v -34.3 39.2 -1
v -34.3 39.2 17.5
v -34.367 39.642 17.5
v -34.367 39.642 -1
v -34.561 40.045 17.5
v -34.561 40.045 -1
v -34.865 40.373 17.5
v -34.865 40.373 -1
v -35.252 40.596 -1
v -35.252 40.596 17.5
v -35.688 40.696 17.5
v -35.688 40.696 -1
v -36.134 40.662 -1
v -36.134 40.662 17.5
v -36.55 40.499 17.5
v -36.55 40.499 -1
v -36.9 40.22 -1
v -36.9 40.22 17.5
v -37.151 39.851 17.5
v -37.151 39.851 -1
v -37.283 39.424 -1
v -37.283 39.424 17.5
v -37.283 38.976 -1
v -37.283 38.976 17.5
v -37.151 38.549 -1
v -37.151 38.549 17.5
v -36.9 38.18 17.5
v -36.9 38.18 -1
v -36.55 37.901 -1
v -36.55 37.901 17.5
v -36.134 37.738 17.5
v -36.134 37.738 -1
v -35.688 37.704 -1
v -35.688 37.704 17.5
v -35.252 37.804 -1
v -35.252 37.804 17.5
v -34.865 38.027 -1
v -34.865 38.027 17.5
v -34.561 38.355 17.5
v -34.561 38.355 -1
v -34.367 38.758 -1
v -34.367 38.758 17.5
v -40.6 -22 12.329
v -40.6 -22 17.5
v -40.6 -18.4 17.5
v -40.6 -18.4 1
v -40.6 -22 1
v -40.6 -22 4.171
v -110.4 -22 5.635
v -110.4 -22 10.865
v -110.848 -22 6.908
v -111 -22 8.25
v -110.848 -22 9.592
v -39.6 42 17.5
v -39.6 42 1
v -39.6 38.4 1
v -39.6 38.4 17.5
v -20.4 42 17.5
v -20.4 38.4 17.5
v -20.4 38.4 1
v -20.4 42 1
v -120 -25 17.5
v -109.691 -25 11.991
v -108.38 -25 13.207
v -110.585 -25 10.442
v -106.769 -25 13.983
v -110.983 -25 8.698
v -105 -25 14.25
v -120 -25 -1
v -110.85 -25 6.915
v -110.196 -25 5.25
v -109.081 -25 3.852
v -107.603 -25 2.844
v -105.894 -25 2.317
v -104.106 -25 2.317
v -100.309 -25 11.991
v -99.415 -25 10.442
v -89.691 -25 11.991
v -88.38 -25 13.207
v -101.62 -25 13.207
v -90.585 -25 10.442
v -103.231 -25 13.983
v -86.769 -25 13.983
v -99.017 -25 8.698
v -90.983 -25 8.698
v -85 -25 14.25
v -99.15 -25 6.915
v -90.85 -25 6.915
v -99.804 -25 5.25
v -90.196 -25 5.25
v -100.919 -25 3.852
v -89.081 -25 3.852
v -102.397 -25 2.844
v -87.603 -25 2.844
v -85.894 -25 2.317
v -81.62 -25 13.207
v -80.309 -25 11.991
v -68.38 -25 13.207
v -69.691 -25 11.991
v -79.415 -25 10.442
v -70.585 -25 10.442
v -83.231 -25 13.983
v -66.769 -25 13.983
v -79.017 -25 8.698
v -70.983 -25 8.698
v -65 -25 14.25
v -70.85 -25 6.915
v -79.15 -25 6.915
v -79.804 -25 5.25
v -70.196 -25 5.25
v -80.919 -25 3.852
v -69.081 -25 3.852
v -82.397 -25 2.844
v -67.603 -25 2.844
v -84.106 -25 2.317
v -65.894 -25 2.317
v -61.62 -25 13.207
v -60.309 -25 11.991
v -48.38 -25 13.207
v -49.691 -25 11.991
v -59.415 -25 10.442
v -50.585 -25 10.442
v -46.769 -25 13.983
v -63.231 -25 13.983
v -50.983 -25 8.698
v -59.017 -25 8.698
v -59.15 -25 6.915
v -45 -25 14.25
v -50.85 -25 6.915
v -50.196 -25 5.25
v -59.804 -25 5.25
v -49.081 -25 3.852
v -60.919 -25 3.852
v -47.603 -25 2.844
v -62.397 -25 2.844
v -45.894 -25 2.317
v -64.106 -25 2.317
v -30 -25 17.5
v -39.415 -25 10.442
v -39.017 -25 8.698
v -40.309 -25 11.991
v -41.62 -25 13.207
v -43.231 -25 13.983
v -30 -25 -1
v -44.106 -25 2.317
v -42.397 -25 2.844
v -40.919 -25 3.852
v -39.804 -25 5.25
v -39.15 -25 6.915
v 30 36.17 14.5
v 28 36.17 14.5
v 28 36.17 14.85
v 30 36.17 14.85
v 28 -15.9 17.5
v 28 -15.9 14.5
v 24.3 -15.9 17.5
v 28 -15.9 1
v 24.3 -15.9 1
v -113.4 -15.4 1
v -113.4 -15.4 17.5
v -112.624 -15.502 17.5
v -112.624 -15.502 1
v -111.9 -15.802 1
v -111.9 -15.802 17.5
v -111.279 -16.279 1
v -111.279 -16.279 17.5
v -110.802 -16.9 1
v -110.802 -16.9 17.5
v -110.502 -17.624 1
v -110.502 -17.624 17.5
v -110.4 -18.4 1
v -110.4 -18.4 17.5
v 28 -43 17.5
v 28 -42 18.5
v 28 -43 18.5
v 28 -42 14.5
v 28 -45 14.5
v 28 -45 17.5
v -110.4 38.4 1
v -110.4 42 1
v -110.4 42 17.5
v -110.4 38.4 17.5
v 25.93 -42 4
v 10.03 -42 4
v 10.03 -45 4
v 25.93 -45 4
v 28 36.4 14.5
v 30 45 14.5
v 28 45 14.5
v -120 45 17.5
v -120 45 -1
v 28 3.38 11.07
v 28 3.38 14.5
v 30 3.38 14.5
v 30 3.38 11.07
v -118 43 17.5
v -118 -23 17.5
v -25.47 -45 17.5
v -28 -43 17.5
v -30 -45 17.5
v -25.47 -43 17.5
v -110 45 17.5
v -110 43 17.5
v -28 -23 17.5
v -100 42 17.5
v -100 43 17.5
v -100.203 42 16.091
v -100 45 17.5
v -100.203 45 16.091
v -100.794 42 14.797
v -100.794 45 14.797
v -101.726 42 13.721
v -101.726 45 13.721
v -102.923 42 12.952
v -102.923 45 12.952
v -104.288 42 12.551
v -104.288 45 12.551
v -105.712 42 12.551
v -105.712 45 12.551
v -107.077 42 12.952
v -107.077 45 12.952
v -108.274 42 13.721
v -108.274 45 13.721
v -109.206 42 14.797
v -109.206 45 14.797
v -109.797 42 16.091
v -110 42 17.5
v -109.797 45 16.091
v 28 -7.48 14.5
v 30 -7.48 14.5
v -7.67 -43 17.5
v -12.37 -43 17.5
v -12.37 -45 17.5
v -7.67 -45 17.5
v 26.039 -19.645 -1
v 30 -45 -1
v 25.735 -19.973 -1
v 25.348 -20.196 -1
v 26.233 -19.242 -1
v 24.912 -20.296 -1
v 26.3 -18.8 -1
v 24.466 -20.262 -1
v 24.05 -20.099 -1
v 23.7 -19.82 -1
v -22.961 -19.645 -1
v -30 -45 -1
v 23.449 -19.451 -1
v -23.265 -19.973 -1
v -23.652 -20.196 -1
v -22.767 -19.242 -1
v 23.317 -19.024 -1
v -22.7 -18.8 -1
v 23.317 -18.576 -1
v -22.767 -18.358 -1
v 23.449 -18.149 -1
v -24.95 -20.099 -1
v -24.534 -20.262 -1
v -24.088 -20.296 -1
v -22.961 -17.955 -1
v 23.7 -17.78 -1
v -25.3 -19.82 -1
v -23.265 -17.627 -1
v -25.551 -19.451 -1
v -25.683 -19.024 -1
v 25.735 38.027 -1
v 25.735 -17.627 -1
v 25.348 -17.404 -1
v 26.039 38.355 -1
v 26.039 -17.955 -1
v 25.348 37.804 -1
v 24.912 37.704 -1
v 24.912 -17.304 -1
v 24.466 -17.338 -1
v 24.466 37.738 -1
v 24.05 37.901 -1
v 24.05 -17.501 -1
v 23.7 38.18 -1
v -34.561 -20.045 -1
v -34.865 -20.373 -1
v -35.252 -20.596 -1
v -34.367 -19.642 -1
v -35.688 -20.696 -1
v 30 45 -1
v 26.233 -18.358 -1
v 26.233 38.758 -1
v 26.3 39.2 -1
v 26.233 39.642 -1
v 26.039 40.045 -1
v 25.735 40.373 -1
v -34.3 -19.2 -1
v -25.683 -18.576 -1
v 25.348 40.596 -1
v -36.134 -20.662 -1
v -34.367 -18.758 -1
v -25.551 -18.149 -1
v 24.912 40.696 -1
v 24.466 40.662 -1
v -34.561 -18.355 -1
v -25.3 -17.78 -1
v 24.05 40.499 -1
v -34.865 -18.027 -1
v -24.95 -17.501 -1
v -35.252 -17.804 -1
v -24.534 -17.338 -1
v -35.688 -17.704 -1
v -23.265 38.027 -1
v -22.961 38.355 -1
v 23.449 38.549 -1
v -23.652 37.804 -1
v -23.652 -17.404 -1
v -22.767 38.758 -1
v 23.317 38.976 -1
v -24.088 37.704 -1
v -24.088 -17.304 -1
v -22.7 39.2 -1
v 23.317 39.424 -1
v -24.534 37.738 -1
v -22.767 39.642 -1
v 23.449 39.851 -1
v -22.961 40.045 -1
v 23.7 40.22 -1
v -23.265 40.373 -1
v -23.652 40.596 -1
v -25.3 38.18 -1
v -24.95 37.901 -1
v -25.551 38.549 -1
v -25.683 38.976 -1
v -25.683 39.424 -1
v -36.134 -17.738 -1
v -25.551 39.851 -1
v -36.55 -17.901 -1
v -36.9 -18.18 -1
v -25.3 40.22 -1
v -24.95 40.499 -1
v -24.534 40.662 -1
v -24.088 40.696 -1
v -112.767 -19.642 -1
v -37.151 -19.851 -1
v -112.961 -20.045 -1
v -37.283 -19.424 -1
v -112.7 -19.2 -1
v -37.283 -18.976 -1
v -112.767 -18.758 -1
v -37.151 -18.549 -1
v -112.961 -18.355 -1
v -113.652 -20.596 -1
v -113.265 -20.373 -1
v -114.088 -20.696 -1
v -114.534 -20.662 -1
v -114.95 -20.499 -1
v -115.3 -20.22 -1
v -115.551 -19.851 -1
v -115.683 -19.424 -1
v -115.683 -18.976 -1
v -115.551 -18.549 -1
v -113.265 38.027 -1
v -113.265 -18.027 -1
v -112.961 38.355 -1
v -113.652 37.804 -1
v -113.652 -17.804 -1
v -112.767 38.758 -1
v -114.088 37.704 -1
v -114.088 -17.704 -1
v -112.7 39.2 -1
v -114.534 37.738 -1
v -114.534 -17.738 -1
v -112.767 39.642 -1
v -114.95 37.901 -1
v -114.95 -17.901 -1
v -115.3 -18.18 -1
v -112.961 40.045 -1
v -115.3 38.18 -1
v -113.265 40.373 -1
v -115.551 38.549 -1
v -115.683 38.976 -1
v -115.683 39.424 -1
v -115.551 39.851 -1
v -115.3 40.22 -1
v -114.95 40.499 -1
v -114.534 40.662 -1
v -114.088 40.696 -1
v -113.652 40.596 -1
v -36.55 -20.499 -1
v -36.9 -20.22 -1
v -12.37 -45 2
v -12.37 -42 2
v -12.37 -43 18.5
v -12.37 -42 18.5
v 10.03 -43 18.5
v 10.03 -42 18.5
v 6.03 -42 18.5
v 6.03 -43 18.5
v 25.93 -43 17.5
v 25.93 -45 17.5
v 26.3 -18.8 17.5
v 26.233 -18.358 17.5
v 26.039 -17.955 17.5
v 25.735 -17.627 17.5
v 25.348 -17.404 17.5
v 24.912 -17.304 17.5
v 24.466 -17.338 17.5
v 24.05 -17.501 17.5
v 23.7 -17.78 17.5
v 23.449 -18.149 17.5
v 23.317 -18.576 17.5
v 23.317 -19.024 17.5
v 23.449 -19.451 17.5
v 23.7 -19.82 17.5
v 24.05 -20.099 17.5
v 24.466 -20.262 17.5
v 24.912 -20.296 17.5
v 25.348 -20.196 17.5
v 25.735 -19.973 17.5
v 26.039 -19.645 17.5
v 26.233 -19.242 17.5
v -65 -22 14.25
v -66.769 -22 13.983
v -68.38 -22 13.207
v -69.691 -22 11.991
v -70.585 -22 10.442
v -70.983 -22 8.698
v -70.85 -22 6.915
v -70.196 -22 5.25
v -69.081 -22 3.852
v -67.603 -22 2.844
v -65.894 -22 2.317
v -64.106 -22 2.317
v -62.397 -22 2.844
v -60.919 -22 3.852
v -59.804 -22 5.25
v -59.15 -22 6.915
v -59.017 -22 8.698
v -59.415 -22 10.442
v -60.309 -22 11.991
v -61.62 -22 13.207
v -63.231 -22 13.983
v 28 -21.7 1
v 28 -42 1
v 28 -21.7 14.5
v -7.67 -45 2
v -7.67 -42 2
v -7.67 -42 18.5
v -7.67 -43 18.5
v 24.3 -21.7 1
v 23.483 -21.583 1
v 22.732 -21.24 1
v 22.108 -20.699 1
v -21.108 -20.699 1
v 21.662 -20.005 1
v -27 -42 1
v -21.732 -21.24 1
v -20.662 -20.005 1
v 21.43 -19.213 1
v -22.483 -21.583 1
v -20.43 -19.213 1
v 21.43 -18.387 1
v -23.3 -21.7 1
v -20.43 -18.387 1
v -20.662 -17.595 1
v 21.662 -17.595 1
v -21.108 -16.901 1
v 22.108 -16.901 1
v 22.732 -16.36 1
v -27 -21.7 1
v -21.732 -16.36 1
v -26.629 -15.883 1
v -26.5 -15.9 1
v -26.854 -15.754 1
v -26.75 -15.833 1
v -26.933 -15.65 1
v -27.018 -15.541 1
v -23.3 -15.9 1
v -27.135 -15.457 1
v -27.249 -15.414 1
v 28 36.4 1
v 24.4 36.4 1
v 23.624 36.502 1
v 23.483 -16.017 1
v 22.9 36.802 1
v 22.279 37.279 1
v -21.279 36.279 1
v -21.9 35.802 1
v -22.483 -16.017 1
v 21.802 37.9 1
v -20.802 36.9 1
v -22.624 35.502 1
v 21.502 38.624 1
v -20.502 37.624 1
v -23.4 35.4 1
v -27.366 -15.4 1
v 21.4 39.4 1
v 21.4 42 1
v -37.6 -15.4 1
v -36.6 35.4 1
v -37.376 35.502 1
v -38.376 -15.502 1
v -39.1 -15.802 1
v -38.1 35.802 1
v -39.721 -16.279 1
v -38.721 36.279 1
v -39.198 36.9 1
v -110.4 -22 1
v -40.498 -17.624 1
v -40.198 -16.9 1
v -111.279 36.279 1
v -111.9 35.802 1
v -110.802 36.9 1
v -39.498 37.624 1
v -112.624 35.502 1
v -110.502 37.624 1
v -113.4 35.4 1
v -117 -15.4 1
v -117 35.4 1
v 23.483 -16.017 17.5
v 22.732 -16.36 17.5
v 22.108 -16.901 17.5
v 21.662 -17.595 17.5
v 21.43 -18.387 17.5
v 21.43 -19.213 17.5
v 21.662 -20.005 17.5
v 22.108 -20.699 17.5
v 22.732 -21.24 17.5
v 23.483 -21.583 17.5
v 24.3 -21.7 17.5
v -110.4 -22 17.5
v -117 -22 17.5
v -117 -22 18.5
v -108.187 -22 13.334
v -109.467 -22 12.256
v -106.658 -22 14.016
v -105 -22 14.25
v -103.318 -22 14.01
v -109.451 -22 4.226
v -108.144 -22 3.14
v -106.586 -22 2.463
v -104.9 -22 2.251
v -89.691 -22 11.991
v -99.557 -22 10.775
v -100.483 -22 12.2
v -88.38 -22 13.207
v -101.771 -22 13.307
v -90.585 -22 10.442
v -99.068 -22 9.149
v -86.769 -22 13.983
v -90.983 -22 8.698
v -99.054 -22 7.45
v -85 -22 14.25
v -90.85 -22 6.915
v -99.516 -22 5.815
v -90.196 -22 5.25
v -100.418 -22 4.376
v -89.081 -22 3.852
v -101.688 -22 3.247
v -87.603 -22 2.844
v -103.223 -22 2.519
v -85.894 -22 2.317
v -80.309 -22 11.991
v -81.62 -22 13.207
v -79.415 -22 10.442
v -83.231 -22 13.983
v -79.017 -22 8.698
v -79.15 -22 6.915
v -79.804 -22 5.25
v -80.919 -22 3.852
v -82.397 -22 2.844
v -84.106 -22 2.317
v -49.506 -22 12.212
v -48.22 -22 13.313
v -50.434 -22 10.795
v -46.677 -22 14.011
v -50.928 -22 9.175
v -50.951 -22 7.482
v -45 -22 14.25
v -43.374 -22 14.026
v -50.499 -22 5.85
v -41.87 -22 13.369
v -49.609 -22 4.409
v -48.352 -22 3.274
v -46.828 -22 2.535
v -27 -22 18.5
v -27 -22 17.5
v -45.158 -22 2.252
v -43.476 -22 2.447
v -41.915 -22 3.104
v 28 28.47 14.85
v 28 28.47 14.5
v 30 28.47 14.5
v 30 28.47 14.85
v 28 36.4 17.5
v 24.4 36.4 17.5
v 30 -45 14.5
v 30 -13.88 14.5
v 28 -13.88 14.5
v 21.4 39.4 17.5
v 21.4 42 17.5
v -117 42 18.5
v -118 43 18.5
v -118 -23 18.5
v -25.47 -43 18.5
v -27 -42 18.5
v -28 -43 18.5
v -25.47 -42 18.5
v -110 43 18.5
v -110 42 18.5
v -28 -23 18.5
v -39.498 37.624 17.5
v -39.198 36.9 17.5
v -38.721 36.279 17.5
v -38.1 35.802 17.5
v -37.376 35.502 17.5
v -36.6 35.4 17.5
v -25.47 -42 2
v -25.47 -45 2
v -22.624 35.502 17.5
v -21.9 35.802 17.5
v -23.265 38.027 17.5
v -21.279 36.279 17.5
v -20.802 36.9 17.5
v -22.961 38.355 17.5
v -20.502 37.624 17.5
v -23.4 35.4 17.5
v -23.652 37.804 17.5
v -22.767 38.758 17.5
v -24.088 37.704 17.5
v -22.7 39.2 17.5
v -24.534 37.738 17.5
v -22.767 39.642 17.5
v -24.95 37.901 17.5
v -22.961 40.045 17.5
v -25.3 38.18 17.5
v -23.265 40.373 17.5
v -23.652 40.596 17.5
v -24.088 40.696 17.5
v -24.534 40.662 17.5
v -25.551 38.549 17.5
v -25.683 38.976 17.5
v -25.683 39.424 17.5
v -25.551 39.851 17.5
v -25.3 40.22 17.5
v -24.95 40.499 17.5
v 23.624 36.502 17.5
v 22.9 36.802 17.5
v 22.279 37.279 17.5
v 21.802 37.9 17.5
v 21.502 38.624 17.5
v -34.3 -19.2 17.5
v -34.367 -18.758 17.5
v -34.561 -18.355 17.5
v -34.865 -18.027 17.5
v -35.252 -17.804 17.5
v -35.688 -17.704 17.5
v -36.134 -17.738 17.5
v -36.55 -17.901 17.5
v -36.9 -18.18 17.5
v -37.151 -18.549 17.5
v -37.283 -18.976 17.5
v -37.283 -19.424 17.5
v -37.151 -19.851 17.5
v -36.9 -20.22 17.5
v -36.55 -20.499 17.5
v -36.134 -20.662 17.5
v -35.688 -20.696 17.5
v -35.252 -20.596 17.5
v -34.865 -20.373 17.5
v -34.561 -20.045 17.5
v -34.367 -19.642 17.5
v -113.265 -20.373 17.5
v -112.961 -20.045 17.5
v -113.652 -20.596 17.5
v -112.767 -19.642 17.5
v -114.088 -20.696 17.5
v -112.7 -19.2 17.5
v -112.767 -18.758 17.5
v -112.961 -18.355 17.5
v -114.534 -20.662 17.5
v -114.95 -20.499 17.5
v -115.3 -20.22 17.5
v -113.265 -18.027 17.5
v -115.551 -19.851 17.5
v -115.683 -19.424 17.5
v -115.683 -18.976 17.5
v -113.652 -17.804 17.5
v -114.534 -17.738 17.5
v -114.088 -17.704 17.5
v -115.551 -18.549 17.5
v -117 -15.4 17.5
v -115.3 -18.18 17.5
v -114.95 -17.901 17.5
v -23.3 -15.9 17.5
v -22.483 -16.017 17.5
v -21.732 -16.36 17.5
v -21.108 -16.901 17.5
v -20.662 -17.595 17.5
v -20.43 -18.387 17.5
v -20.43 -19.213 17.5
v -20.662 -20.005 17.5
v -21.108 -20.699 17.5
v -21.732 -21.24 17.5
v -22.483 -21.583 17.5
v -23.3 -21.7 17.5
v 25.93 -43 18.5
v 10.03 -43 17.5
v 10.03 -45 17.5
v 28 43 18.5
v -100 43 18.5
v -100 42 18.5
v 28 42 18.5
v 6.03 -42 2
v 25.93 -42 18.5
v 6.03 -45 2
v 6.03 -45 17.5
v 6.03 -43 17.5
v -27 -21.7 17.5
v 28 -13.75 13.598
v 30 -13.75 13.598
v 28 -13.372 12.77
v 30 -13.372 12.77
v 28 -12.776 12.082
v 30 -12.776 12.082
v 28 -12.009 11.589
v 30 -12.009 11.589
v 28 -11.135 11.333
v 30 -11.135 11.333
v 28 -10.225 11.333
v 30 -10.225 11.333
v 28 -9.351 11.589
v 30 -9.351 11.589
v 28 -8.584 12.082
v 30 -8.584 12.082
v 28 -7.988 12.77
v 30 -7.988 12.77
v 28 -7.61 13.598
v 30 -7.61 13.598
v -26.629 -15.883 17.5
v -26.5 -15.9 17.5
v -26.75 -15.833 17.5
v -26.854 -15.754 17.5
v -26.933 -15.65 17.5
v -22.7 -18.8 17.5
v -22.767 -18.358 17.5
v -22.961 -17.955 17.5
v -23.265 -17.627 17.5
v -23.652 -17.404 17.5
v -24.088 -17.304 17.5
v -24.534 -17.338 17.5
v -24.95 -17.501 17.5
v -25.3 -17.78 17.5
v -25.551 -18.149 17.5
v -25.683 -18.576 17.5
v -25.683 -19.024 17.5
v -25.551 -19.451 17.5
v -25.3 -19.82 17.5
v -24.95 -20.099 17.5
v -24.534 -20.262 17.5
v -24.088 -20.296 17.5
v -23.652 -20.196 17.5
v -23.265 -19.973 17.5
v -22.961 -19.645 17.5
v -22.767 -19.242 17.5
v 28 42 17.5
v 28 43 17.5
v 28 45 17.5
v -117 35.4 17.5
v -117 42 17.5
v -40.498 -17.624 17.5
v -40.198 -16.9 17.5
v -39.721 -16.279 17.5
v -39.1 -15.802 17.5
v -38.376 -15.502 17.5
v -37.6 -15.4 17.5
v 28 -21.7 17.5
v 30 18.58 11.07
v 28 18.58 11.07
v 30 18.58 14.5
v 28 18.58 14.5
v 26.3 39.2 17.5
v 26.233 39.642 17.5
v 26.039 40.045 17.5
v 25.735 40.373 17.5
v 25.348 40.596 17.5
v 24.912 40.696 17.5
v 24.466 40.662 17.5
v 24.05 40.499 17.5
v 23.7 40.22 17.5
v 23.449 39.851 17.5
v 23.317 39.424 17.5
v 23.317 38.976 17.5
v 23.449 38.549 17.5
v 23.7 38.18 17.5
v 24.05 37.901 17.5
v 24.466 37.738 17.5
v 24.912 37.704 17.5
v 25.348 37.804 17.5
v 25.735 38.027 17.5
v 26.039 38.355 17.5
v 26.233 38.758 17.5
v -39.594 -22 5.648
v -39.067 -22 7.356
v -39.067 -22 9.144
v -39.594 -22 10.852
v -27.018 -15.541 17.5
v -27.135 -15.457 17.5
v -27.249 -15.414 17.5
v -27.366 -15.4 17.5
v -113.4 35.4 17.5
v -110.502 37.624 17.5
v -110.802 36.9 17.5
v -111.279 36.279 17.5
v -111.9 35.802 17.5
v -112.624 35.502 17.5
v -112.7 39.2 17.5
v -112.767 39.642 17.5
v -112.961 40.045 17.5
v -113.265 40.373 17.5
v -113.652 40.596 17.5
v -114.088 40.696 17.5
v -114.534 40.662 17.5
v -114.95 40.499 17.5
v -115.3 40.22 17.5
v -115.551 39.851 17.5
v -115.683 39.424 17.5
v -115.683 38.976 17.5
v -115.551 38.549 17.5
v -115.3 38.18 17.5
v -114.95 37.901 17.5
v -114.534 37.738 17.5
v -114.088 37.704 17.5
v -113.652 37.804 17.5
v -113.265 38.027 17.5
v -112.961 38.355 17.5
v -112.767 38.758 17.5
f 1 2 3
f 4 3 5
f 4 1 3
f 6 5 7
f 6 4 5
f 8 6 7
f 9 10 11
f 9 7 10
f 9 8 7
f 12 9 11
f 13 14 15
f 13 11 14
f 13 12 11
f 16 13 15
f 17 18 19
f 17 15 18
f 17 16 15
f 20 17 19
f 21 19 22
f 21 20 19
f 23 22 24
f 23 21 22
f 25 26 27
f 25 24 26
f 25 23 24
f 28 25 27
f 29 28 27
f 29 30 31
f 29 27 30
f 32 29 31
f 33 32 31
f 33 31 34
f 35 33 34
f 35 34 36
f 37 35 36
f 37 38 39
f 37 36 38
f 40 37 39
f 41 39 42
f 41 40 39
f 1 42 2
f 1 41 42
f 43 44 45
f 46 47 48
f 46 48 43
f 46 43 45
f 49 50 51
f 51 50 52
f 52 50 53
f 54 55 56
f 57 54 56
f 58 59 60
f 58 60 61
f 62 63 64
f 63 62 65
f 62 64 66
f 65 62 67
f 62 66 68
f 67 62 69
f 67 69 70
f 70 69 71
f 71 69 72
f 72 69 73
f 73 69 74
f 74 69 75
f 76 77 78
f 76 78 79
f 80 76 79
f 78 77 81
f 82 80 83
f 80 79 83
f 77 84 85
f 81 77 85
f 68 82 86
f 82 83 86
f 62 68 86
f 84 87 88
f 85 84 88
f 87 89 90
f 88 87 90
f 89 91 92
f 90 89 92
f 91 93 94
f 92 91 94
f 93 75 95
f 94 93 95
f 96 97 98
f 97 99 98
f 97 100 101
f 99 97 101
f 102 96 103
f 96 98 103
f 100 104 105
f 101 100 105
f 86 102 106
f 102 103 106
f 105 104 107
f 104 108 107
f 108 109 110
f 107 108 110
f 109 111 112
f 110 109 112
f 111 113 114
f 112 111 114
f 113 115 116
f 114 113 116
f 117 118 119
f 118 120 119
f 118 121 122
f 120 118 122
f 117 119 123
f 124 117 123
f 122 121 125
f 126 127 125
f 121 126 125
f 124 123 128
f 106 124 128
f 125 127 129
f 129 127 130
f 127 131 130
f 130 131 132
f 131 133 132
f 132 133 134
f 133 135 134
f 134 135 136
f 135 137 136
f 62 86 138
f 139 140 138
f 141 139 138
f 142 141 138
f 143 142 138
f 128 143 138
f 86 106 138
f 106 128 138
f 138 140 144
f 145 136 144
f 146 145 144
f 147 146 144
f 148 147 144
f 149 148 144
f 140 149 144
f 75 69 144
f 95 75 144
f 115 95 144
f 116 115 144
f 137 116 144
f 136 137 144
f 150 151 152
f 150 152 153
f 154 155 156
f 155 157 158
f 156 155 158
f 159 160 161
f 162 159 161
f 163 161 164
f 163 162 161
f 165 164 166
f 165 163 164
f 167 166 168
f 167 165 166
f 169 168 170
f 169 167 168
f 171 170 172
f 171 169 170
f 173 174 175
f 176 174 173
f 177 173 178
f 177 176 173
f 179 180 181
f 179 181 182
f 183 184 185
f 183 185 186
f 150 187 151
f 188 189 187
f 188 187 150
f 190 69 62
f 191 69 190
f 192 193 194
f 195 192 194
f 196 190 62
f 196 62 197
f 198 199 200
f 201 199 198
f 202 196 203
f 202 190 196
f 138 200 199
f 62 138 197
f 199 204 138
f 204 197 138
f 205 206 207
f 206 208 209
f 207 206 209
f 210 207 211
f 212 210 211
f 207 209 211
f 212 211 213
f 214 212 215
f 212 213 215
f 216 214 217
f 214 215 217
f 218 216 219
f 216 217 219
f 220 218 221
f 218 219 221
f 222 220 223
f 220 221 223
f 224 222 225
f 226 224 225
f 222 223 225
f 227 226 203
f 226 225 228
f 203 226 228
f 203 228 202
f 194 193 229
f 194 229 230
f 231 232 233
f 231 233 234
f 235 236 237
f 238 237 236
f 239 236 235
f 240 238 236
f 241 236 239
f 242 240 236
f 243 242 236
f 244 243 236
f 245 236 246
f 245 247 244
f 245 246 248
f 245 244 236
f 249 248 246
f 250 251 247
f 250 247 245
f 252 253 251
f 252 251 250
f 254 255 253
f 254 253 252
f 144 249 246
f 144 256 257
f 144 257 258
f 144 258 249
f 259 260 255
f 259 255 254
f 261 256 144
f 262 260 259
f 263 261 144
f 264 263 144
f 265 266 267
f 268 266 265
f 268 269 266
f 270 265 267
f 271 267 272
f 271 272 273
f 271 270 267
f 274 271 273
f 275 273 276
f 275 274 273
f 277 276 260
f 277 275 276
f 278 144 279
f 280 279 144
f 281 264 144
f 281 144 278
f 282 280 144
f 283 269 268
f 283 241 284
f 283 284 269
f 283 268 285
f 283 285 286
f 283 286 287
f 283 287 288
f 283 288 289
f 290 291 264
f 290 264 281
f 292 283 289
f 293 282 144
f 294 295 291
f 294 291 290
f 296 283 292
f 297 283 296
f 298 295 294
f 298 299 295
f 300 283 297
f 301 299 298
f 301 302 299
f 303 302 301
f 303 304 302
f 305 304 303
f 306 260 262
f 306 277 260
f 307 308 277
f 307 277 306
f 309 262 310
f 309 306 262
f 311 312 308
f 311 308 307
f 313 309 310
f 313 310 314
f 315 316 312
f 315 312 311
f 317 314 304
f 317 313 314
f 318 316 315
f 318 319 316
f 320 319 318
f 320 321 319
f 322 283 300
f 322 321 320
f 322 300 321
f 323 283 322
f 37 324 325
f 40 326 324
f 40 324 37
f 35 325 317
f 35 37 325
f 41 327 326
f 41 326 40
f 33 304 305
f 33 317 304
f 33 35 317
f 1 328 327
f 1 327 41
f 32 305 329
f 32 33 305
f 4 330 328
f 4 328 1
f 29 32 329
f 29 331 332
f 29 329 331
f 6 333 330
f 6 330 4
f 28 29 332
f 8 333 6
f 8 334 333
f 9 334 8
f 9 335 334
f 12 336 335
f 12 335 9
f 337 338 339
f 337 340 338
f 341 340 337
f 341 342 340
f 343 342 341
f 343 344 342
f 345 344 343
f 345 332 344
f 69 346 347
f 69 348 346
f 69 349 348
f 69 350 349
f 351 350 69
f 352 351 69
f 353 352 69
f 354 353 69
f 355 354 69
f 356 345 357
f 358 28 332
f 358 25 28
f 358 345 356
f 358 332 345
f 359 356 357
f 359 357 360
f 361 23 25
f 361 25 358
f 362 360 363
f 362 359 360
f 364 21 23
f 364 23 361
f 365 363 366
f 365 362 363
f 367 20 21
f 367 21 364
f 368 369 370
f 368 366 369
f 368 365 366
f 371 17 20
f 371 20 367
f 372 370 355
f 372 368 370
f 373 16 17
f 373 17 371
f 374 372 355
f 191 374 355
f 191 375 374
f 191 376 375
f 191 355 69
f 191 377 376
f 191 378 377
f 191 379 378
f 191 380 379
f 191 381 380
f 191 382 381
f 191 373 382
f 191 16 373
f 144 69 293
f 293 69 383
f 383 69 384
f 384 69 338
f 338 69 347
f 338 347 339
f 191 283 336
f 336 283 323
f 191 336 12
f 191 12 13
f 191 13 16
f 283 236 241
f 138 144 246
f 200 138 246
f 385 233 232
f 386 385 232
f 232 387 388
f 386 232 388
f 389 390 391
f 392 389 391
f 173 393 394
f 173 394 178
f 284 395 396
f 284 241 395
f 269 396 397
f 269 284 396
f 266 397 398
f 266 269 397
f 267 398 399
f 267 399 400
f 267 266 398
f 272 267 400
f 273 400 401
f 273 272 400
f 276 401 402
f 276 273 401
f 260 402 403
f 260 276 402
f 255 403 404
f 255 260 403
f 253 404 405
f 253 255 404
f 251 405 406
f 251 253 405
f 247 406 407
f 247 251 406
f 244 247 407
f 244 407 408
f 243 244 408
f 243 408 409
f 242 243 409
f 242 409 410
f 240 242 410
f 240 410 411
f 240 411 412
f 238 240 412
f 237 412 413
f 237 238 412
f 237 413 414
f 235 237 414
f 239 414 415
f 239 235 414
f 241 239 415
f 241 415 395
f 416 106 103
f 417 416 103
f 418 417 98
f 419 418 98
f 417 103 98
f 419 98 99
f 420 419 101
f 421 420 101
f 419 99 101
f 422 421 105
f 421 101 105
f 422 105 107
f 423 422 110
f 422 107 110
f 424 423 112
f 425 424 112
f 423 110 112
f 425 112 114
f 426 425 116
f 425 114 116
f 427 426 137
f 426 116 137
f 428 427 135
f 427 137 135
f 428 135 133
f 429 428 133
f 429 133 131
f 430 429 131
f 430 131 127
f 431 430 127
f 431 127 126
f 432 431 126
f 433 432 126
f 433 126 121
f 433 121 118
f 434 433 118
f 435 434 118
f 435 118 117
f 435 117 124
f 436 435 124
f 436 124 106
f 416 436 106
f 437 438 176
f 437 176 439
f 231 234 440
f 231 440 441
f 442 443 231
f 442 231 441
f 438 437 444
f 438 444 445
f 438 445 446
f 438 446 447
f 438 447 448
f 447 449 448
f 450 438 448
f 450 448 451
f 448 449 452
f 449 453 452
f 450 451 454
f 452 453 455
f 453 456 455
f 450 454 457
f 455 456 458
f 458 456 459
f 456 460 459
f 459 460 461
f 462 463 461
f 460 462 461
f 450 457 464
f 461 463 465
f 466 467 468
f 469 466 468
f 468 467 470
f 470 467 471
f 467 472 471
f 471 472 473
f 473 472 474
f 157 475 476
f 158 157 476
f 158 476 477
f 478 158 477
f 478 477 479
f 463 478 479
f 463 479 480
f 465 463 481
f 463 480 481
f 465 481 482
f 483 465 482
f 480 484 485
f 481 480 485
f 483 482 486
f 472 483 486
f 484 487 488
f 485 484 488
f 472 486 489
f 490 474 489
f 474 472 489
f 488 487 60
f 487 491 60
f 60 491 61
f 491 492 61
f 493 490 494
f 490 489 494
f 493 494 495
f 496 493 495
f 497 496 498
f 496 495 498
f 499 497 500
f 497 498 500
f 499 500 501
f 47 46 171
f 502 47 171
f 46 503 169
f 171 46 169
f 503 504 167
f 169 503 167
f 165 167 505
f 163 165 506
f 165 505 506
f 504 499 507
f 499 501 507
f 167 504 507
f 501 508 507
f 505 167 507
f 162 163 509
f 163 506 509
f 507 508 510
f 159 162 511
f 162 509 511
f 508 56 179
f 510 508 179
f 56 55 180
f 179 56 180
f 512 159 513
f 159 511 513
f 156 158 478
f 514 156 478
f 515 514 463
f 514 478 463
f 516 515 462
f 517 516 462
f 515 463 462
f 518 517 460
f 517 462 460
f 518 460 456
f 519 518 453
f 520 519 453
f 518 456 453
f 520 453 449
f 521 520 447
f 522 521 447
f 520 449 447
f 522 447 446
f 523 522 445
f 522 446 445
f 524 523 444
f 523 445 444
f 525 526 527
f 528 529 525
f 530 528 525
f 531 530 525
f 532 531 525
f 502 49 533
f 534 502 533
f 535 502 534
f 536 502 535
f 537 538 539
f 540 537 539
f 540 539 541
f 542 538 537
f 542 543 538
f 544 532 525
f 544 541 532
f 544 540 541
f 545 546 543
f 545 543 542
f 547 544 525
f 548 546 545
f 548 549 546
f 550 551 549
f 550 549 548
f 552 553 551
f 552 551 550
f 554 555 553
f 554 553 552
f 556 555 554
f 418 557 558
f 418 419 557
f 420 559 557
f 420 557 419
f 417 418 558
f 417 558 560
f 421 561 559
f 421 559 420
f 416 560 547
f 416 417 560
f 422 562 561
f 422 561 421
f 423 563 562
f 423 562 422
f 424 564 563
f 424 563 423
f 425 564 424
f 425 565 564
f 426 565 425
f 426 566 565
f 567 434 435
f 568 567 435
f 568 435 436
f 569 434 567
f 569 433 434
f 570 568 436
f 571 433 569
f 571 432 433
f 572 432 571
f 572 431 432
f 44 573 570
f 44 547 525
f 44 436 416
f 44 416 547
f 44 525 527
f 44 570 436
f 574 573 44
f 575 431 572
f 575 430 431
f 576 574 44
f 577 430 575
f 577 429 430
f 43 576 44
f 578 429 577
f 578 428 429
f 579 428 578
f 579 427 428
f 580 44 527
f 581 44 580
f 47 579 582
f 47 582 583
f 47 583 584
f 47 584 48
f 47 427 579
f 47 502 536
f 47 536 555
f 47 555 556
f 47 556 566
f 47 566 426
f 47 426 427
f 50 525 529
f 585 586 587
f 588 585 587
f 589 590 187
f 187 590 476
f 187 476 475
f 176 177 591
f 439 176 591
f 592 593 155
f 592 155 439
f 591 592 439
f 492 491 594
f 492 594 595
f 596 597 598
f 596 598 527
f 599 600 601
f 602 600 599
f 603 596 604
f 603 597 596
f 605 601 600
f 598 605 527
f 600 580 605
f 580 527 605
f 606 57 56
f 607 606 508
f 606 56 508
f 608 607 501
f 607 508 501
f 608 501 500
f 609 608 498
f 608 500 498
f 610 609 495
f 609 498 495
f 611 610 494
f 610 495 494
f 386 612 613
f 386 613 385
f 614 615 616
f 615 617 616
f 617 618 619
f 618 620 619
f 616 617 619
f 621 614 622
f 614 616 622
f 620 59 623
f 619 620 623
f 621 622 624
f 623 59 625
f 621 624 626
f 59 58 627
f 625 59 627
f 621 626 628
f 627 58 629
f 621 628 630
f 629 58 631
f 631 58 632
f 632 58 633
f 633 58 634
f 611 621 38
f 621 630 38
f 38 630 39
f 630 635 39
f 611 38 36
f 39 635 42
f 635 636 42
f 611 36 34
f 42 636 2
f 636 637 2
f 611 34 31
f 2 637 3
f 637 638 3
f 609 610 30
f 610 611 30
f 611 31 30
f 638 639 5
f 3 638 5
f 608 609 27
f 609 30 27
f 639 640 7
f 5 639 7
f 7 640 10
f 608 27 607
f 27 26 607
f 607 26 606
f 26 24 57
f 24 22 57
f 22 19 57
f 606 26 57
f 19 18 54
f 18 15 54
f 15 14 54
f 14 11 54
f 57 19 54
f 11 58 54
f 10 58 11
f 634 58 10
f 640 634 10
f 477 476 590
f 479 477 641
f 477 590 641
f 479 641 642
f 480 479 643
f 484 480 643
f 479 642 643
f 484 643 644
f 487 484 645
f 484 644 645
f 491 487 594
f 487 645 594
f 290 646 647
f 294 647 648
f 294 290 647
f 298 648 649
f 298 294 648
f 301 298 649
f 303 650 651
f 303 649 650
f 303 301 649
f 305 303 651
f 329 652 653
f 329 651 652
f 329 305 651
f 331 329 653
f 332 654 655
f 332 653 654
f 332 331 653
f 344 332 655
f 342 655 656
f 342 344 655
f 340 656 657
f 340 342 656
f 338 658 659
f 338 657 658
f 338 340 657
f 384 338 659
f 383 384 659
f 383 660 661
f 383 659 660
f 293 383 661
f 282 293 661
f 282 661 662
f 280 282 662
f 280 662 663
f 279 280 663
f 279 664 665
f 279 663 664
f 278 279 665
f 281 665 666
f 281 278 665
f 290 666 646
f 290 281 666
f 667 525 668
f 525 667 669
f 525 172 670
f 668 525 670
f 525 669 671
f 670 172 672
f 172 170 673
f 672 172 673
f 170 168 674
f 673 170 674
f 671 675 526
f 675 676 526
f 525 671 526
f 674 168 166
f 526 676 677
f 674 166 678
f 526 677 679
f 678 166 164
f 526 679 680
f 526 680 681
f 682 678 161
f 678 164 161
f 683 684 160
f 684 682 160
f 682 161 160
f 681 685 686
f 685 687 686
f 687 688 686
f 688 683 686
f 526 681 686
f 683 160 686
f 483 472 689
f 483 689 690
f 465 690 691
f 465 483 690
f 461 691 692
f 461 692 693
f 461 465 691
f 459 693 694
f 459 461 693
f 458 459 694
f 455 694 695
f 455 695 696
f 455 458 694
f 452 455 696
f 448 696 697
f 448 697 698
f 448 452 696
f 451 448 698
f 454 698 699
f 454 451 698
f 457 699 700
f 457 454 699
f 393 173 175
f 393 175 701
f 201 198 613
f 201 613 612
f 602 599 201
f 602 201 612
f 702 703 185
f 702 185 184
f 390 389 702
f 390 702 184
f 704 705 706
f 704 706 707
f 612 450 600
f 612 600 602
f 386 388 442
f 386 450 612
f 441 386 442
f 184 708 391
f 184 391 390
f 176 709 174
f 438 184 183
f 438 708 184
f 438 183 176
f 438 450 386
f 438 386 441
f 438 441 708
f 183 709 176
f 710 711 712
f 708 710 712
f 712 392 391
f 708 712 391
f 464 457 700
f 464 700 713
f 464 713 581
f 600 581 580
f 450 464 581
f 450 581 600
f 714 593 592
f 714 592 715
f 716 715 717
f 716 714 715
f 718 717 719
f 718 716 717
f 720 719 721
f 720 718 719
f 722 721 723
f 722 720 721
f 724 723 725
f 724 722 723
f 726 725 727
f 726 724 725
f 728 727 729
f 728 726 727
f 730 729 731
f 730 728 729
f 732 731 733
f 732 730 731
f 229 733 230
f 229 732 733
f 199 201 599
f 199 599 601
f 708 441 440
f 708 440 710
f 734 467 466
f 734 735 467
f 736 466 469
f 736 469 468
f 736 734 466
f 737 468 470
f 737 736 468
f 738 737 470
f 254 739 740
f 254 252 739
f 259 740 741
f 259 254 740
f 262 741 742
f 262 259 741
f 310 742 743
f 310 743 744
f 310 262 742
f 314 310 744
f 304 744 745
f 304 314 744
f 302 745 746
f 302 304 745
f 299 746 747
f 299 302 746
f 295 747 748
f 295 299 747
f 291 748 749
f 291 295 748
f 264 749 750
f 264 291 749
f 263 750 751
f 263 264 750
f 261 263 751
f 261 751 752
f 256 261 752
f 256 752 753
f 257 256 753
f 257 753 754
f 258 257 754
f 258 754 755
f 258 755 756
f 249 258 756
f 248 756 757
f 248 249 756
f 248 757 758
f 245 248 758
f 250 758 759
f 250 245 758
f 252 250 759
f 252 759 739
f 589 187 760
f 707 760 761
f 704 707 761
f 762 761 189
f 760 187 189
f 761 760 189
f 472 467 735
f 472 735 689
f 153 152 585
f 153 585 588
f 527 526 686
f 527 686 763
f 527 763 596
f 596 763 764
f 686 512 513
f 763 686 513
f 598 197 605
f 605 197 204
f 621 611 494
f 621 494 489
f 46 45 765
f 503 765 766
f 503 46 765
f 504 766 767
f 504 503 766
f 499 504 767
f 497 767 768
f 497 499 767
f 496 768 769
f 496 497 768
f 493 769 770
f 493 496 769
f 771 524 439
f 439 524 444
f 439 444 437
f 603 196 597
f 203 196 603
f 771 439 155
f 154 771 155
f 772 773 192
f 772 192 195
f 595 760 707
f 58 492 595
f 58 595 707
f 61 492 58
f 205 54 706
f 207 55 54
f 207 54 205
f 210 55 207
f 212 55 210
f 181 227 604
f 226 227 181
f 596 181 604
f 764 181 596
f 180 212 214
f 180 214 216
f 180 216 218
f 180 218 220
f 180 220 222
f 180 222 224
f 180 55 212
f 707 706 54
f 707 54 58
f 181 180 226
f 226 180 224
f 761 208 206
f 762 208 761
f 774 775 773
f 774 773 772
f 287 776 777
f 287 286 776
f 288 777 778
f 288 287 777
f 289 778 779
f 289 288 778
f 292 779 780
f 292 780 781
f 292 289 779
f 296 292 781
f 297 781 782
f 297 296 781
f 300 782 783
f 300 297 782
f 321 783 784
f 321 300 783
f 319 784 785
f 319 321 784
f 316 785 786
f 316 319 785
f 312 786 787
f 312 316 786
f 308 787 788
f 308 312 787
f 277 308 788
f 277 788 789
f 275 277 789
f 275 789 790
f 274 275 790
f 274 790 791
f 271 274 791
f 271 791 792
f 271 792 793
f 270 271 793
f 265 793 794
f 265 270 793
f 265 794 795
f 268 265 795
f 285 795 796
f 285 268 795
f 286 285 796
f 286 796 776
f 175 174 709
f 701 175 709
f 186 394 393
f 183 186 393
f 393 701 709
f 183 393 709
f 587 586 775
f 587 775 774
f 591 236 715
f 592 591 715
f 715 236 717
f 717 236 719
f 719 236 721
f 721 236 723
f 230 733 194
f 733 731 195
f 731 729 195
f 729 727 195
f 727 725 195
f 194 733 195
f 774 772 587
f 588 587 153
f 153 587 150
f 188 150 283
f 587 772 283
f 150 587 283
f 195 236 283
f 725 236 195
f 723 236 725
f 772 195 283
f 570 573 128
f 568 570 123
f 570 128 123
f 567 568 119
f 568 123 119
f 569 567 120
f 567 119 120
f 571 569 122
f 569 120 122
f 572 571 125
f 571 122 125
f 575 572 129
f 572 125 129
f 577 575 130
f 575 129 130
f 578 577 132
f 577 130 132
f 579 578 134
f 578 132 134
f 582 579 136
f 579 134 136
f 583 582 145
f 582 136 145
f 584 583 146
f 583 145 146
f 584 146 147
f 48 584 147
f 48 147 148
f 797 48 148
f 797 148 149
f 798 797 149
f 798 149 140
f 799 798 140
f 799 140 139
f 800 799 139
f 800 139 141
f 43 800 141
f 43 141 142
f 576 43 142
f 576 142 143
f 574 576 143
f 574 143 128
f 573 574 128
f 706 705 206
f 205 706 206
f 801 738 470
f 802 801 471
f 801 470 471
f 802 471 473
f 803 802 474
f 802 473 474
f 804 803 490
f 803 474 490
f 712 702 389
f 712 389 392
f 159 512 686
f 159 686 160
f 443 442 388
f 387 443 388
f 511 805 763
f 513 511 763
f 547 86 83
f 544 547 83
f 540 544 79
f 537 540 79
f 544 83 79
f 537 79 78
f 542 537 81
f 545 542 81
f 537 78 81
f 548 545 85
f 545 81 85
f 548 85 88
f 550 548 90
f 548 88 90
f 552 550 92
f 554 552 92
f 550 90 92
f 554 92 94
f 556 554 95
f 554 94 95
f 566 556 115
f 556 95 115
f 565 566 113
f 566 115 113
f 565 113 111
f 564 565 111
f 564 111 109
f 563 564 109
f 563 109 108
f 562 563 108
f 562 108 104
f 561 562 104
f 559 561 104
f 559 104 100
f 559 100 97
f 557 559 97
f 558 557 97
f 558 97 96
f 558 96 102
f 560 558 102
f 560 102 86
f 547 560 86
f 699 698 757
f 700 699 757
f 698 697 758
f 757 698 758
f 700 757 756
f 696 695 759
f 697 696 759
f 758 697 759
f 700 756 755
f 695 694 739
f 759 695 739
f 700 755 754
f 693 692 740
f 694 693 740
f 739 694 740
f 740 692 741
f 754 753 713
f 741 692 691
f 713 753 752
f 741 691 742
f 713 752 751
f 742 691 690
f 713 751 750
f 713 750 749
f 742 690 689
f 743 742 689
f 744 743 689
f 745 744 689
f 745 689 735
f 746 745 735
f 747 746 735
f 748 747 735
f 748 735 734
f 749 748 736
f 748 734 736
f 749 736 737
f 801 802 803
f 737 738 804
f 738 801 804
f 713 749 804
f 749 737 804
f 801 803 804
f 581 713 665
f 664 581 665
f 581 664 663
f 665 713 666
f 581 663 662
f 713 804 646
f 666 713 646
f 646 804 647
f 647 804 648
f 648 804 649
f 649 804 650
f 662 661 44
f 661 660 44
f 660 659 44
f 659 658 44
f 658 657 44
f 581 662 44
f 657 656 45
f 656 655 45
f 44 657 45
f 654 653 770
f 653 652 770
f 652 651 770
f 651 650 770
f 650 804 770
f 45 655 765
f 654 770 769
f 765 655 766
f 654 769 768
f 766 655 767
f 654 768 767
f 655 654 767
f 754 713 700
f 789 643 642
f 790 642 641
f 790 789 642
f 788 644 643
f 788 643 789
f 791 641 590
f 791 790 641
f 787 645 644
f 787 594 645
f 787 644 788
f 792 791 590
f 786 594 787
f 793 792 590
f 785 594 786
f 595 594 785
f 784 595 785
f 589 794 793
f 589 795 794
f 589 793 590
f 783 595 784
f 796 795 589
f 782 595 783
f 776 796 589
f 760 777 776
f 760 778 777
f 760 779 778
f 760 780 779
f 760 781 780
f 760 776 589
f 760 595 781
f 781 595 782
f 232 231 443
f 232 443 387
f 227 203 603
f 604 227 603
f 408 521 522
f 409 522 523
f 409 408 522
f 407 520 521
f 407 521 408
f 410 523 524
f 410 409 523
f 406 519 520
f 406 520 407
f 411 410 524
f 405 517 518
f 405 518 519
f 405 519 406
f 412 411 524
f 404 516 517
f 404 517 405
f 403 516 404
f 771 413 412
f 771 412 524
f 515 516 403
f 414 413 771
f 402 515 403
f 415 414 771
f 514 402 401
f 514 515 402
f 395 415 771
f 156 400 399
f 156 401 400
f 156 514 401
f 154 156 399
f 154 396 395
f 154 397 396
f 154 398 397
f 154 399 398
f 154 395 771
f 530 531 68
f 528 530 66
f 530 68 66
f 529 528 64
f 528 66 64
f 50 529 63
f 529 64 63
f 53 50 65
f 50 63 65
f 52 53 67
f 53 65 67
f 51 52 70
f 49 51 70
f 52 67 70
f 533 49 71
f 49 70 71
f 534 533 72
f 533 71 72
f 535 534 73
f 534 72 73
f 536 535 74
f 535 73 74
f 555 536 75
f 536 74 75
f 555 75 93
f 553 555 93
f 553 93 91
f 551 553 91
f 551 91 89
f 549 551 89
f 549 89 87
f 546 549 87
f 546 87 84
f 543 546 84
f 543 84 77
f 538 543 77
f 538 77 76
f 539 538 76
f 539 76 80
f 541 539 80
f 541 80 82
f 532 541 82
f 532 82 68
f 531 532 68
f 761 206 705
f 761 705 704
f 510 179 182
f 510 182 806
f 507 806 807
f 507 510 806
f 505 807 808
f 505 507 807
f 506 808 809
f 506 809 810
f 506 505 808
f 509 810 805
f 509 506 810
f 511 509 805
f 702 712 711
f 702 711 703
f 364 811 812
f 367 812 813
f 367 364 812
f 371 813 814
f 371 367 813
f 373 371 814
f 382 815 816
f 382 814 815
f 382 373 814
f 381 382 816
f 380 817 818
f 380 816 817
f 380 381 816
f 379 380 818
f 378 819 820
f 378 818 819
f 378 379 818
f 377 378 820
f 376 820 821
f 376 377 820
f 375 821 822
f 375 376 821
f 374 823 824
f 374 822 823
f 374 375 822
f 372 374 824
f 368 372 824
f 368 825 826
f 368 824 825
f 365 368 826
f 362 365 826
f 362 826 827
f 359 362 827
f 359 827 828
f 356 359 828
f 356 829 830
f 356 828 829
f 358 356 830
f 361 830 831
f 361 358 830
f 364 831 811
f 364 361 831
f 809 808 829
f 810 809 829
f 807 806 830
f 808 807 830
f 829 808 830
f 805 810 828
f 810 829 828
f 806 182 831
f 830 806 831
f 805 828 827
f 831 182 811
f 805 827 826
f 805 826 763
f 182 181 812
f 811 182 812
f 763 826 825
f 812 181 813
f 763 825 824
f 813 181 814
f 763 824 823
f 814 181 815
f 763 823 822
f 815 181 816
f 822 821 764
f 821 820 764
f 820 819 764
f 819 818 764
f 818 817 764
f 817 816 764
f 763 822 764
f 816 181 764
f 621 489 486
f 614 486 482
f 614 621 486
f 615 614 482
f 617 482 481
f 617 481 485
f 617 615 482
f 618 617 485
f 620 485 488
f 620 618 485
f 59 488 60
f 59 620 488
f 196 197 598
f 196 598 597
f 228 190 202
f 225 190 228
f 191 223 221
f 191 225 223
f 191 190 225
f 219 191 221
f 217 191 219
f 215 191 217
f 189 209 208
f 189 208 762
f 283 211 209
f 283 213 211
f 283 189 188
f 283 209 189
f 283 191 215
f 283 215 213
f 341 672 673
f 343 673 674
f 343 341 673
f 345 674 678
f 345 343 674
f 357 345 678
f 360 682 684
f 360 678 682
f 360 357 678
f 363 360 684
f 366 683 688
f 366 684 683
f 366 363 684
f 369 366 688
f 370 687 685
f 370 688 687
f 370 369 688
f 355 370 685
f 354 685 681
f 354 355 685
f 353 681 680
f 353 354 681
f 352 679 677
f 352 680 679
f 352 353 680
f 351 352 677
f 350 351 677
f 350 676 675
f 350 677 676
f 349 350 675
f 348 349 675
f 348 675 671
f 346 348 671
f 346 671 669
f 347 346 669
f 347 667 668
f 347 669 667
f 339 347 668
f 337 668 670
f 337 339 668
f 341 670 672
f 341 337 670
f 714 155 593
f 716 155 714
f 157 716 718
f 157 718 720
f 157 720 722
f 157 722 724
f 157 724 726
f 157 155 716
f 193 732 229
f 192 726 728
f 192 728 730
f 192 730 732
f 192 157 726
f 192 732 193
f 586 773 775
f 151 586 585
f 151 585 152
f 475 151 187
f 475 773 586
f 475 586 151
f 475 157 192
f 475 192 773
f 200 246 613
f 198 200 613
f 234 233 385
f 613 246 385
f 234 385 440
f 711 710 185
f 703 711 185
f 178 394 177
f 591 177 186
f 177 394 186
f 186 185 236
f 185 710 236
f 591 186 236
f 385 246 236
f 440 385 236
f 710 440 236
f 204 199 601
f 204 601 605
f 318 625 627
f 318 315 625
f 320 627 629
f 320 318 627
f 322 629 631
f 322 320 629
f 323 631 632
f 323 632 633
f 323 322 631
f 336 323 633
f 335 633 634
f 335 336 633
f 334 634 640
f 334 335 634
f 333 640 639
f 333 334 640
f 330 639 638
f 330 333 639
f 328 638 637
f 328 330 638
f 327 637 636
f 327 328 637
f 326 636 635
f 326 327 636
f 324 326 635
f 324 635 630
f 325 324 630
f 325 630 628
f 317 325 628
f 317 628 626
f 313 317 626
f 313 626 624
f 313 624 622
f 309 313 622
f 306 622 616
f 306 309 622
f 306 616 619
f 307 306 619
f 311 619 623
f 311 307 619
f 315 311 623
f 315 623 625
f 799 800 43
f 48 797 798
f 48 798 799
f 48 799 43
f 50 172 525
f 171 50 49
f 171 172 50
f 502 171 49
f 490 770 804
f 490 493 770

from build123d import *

# Parameters (mm, degrees)
SKETCH1_W                      = 60
SKETCH1_H                      = 90
SKETCH1_R                      = 1.5
BOSS_EXTRUDE1_DEPTH            = 1
BOSS_EXTRUDE2_DEPTH            = 16.5
SKETCH3_W                      = 2
SKETCH3_H                      = 90
BOSS_EXTRUDE3_DEPTH            = 13.5
BOSS_EXTRUDE4_DEPTH            = 1
SKETCH5_W                      = 13.1
SKETCH5_H                      = 3
SKETCH5_W_2                    = 13.7
CUT_EXTRUDE1_DEPTH             = 16.5
SKETCH6_W                      = 15.9
SKETCH6_H                      = 3
CUT_EXTRUDE2_DEPTH             = 14.5
SKETCH7_R                      = 1.5
SKETCH7_W                      = 6.6
SKETCH7_H                      = 6.6
SKETCH7_H_2                    = 5.6
BOSS_EXTRUDE5_DEPTH            = 16.5
FILLET3_R                      = 3
CUT_EXTRUDE3_DEPTH             = 78.24797732
CUT_EXTRUDE3_DEPTH_BACK        = 2
SKETCH10_W                     = 2
SKETCH10_H                     = 15.2
CUT_EXTRUDE4_DEPTH             = 3.43
SKETCH11_W                     = 2
SKETCH11_H                     = 7.7
BOSS_EXTRUDE6_DEPTH            = 0.35
SKETCH13_W                     = 90
SKETCH13_H                     = 70
BOSS_EXTRUDE7_DEPTH            = 2
SKETCH14_W                     = 90
SKETCH14_H                     = 70
SKETCH14_W_2                   = 84
SKETCH14_H_2                   = 64
BOSS_EXTRUDE8_DEPTH            = 16.5
SKETCH15_W                     = 86
SKETCH15_H                     = 66
SKETCH15_W_2                   = 84
SKETCH15_H_2                   = 64
SKETCH15_W_3                   = 4
SKETCH15_H_3                   = 1
BOSS_EXTRUDE9_DEPTH            = 1
SKETCH16_W                     = 6
SKETCH16_H                     = 64
CUT_EXTRUDE6_DEPTH             = 1
CUT_EXTRUDE7_REACH             = 142.151
SKETCH17_R                     = 6
CUT_EXTRUDE7_DIRECTION_2_DEPTH = 141.150811628
BOSS_EXTRUDE10_DEPTH           = 16.5
CUT_EXTRUDE8_DEPTH             = 56
CUT_EXTRUDE8_DEPTH_BACK        = 19
SKETCH18_R                     = 1.5
SKETCH20_W                     = 6
SKETCH20_H                     = 50.8
CUT_EXTRUDE9_DEPTH             = 16.5
FILLET4_R                      = 0.5
FILLET5_R                      = 0.5
CUT_EXTRUDE10_DEPTH            = 4


with BuildPart() as part:
    # Sketch1 → Boss-Extrude1 (new, symmetric)
    with BuildSketch(Plane.XY):
        Rectangle(SKETCH1_W, SKETCH1_H)
        with Locations((-24.2, -18.8)):
            Circle(SKETCH1_R, mode=Mode.SUBTRACT)
        with Locations((-24.2, 39.2)):
            Circle(SKETCH1_R, mode=Mode.SUBTRACT)
        with Locations((24.8, 39.2)):
            Circle(SKETCH1_R, mode=Mode.SUBTRACT)
        with Locations((24.8, -18.8)):
            Circle(SKETCH1_R, mode=Mode.SUBTRACT)
    extrude(amount=BOSS_EXTRUDE1_DEPTH, both=True)

    # Sketch2 → Boss-Extrude2 (add)
    with BuildSketch(Plane.XY.offset(1)):
        Polygon((-27, 42), (28, 42), (28, 45), (-30, 45), (-30, -45), (28, -45), (28, -42), (-27, -42), align=None)
    extrude(amount=BOSS_EXTRUDE2_DEPTH)

    # Sketch3 → Boss-Extrude3 (add)
    with BuildSketch(Plane.XY.offset(1)):
        with Locations((29, 0)):
            Rectangle(SKETCH3_W, SKETCH3_H)
    extrude(amount=BOSS_EXTRUDE3_DEPTH)

    # Sketch4 → Boss-Extrude4 (add)
    with BuildSketch(Plane.XY.offset(17.5)):
        Polygon((28, -43), (-28, -43), (-28, 43), (28, 43), (28, 42), (-27, 42), (-27, -42), (28, -42), align=None)
    extrude(amount=BOSS_EXTRUDE4_DEPTH)

    # Sketch5 → Cut-Extrude1 (cut)
    with BuildSketch(Plane.XY.offset(18.5)):
        with Locations((-18.92, -43.5)):
            Rectangle(SKETCH5_W, SKETCH5_H)
        with Locations((-0.82, -43.5)):
            Rectangle(SKETCH5_W_2, SKETCH5_H)
    extrude(amount=-CUT_EXTRUDE1_DEPTH, mode=Mode.SUBTRACT)

    # Sketch6 → Cut-Extrude2 (cut)
    with BuildSketch(Plane.XY.offset(18.5)):
        with Locations((17.98, -43.5)):
            Rectangle(SKETCH6_W, SKETCH6_H)
    extrude(amount=-CUT_EXTRUDE2_DEPTH, mode=Mode.SUBTRACT)

    # Sketch7 → Boss-Extrude5 (add)
    # profile 1 of 4: a face of its own
    with BuildSketch(Plane.XY.offset(1)):
        with BuildLine():
            Line((-27, -15.9), (-23.3, -15.9))
            ThreePointArc((-23.3, -15.9), (-20.4, -18.8), (-23.3, -21.7))
            Line((-23.3, -21.7), (-27, -21.7))
            Line((-27, -21.7), (-27, -15.9))
        make_face()
        with Locations((-24.2, -18.8)):
            Circle(SKETCH7_R, mode=Mode.SUBTRACT)
    # profile 2 of 4: a face of its own
    with BuildSketch(Plane.XY.offset(1)):
        with Locations((-23.7, 38.7)):
            Rectangle(SKETCH7_W, SKETCH7_H)
        with Locations((-24.2, 39.2)):
            Circle(SKETCH7_R, mode=Mode.SUBTRACT)
    # profile 3 of 4: a face of its own
    with BuildSketch(Plane.XY.offset(1)):
        with BuildLine():
            Line((24.3, -21.7), (28, -21.7))
            Line((28, -21.7), (28, -15.9))
            Line((28, -15.9), (24.3, -15.9))
            ThreePointArc((24.3, -15.9), (21.4, -18.8), (24.3, -21.7))
        make_face()
        with Locations((24.8, -18.8)):
            Circle(SKETCH7_R, mode=Mode.SUBTRACT)
    # profile 4 of 4: a face of its own
    with BuildSketch(Plane.XY.offset(1)):
        with Locations((24.7, 39.2)):
            Rectangle(SKETCH7_W, SKETCH7_H_2)
        with Locations((24.8, 39.2)):
            Circle(SKETCH7_R, mode=Mode.SUBTRACT)
    extrude(amount=BOSS_EXTRUDE5_DEPTH)

    # Fillet3
    fillet3_edges = [part.edges().sort_by_distance(p)[0] for p in [
        (-20.4, 35.4, 9.25),
        (21.4, 36.4, 9.25),
    ]]
    fillet(fillet3_edges, radius=FILLET3_R)

    # Sketch9 → Cut-Extrude3 (cut, two sides: drawn at the far end of the back side and taken through both)
    with BuildSketch(Plane(origin=(30, 0, 0), x_dir=(0, 0, -1), z_dir=(1, 0, 0)).offset(-CUT_EXTRUDE3_DEPTH_BACK)):
        with BuildLine():
            Line((-146.271990211, -13.88), (-14.5, -13.88))
            ThreePointArc((-14.5, -13.88), (-11.3, -10.68), (-14.5, -7.48))
            Line((-14.5, -7.48), (-146.271990211, -7.48))
            Line((-146.271990211, -7.48), (-409.815970634, -7.48))
            Line((-409.815970634, -7.48), (-409.815970634, -13.88))
            Line((-409.815970634, -13.88), (-146.271990211, -13.88))
        make_face()
    extrude(amount=CUT_EXTRUDE3_DEPTH + CUT_EXTRUDE3_DEPTH_BACK, mode=Mode.SUBTRACT)

    # Sketch10 → Cut-Extrude4 (cut)
    with BuildSketch(Plane.XY.offset(14.5)):
        with Locations((29, 10.98)):
            Rectangle(SKETCH10_W, SKETCH10_H)
    extrude(amount=-CUT_EXTRUDE4_DEPTH, mode=Mode.SUBTRACT)

    # Sketch11 → Boss-Extrude6 (add)
    with BuildSketch(Plane.XY.offset(14.5)):
        with Locations((29, 32.32)):
            Rectangle(SKETCH11_W, SKETCH11_H)
    extrude(amount=BOSS_EXTRUDE6_DEPTH)

    # Sketch13 → Boss-Extrude7 (add)
    with BuildSketch(Plane(origin=(0, 0, -1), x_dir=(-1, 0, 0), z_dir=(0, 0, -1))):
        with Locations((75, 10)):
            Rectangle(SKETCH13_W, SKETCH13_H)
    extrude(amount=-BOSS_EXTRUDE7_DEPTH)

    # Sketch14 → Boss-Extrude8 (add)
    with BuildSketch(Plane.XY.offset(1)):
        with Locations((-75, 10)):
            Rectangle(SKETCH14_W, SKETCH14_H)
        with Locations((-75, 10)):
            Rectangle(SKETCH14_W_2, SKETCH14_H_2, mode=Mode.SUBTRACT)
    extrude(amount=BOSS_EXTRUDE8_DEPTH)

    # Sketch15 → Boss-Extrude9 (add)
    # profile 1 of 3: a face of its own
    with BuildSketch(Plane.XY.offset(17.5)):
        with Locations((-75, 10)):
            Rectangle(SKETCH15_W, SKETCH15_H)
        with Locations((-75, 10)):
            Rectangle(SKETCH15_W_2, SKETCH15_H_2, mode=Mode.SUBTRACT)
    # profile 2 of 3: a face of its own
    with BuildSketch(Plane.XY.offset(17.5)):
        with Locations((-30, -22.5)):
            Rectangle(SKETCH15_W_3, SKETCH15_H_3)
    # profile 3 of 3: a face of its own
    with BuildSketch(Plane.XY.offset(17.5)):
        with Locations((-30, 42.5)):
            Rectangle(SKETCH15_W_3, SKETCH15_H_3)
    extrude(amount=BOSS_EXTRUDE9_DEPTH)

    # Sketch16 → Cut-Extrude6 (cut)
    with BuildSketch(Plane.XY.offset(18.5)):
        with Locations((-30, 10)):
            Rectangle(SKETCH16_W, SKETCH16_H)
    extrude(amount=-CUT_EXTRUDE6_DEPTH, mode=Mode.SUBTRACT)

    # Sketch17 → Cut-Extrude7 (cut, up to next)
    with BuildSketch(Plane.XZ.offset(25), mode=Mode.PRIVATE) as cut_extrude7_sk1:
        with Locations(Location((-45, 8.25, 0), (0, 0, 90))):
            Circle(SKETCH17_R)
    cut_extrude7_tool1 = extrude(cut_extrude7_sk1.sketch, amount=-CUT_EXTRUDE7_REACH, mode=Mode.PRIVATE) & part.part
    # Sketch17 → Cut-Extrude7 (cut, up to next)
    with BuildSketch(Plane.XZ.offset(25), mode=Mode.PRIVATE) as cut_extrude7_sk2:
        with Locations(Location((-65, 8.25, 0), (0, 0, 90))):
            Circle(SKETCH17_R)
    cut_extrude7_tool2 = extrude(cut_extrude7_sk2.sketch, amount=-CUT_EXTRUDE7_REACH, mode=Mode.PRIVATE) & part.part
    # Sketch17 → Cut-Extrude7 (cut, up to next)
    with BuildSketch(Plane.XZ.offset(25), mode=Mode.PRIVATE) as cut_extrude7_sk3:
        with Locations(Location((-85, 8.25, 0), (0, 0, 90))):
            Circle(SKETCH17_R)
    cut_extrude7_tool3 = extrude(cut_extrude7_sk3.sketch, amount=-CUT_EXTRUDE7_REACH, mode=Mode.PRIVATE) & part.part
    # Sketch17 → Cut-Extrude7 (cut, up to next)
    with BuildSketch(Plane.XZ.offset(25), mode=Mode.PRIVATE) as cut_extrude7_sk4:
        with Locations(Location((-105, 8.25, 0), (0, 0, 90))):
            Circle(SKETCH17_R)
    cut_extrude7_tool4 = extrude(cut_extrude7_sk4.sketch, amount=-CUT_EXTRUDE7_REACH, mode=Mode.PRIVATE) & part.part
    add(cut_extrude7_tool1.solids().sort_by_distance((-45, -25, 8.25))[0], mode=Mode.SUBTRACT)
    add(cut_extrude7_tool2.solids().sort_by_distance((-65, -25, 8.25))[0], mode=Mode.SUBTRACT)
    add(cut_extrude7_tool3.solids().sort_by_distance((-85, -25, 8.25))[0], mode=Mode.SUBTRACT)
    add(cut_extrude7_tool4.solids().sort_by_distance((-105, -25, 8.25))[0], mode=Mode.SUBTRACT)

    # Sketch17 → Cut-Extrude7 direction 2 (cut)
    with BuildSketch(Plane.XZ.offset(25)):
        with Locations(Location((-45, 8.25, 0), (0, 0, 90))):
            Circle(SKETCH17_R)
        with Locations(Location((-65, 8.25, 0), (0, 0, 90))):
            Circle(SKETCH17_R)
        with Locations(Location((-85, 8.25, 0), (0, 0, 90))):
            Circle(SKETCH17_R)
        with Locations(Location((-105, 8.25, 0), (0, 0, 90))):
            Circle(SKETCH17_R)
    extrude(amount=CUT_EXTRUDE7_DIRECTION_2_DEPTH, mode=Mode.SUBTRACT)

    # Sketch19 → Boss-Extrude10 (add)
    with BuildSketch(Plane.XY.offset(1)):
        with BuildLine():
            Line((-117, -15.400002114), (-113.400002114, -15.400002114))
            ThreePointArc((-113.400002114, -15.400002114), (-111.27868177, -16.27868177), (-110.400002114, -18.400002114))
            Line((-110.400002114, -18.400002114), (-110.400002114, -22))
            Line((-110.400002114, -22), (-117, -22))
            Line((-117, -22), (-117, -15.400002114))
        make_face()
        with BuildLine():
            Line((-40.6, -22), (-40.6, -18.4))
            ThreePointArc((-40.6, -18.4), (-39.721320344, -16.278679656), (-37.6, -15.4))
            Line((-37.6, -15.4), (-33, -15.4))
            Line((-33, -15.4), (-33, -22))
            Line((-33, -22), (-40.6, -22))
        make_face()
        with BuildLine():
            Line((-39.6, 42), (-39.6, 38.4))
            ThreePointArc((-39.6, 38.4), (-38.721320344, 36.278679656), (-36.6, 35.4))
            Line((-36.6, 35.4), (-33, 35.4))
            Line((-33, 35.4), (-33, 42))
            Line((-33, 42), (-39.6, 42))
        make_face()
        with BuildLine():
            Line((-110.4, 42), (-110.4, 38.4))
            ThreePointArc((-110.4, 38.4), (-111.278679656, 36.278679656), (-113.4, 35.4))
            Line((-113.4, 35.4), (-117, 35.4))
            Line((-117, 35.4), (-117, 42))
            Line((-117, 42), (-110.4, 42))
        make_face()
    extrude(amount=BOSS_EXTRUDE10_DEPTH)

    # Sketch18 → Cut-Extrude8 (cut, two sides: drawn at the far end of the back side and taken through both)
    with BuildSketch(Plane.XY.offset(1).offset(-CUT_EXTRUDE8_DEPTH_BACK)):
        with Locations((-114.2, 39.2)):
            Circle(SKETCH18_R)
        with Locations((-35.8, 39.2)):
            Circle(SKETCH18_R)
        with Locations((-35.8, -19.2)):
            Circle(SKETCH18_R)
        with Locations((-114.2, -19.2)):
            Circle(SKETCH18_R)
    extrude(amount=CUT_EXTRUDE8_DEPTH + CUT_EXTRUDE8_DEPTH_BACK, mode=Mode.SUBTRACT)

    # Sketch20 → Cut-Extrude9 (cut)
    with BuildSketch(Plane.XY.offset(17.5)):
        with Locations((-30, 10)):
            Rectangle(SKETCH20_W, SKETCH20_H)
    extrude(amount=-CUT_EXTRUDE9_DEPTH, mode=Mode.SUBTRACT)

    # Fillet4
    fillet4_edges = [part.edges().sort_by_distance(p)[0] for p in [
        (-27, -15.9, 9.25),
    ]]
    fillet(fillet4_edges, radius=FILLET4_R - 0.0001)  # a hair under: the kernel refuses the full size

    # Fillet5
    fillet5_edges = [part.edges().sort_by_distance(p)[0] for p in [
        (-27, -15.4, 9.25),
    ]]
    fillet(fillet5_edges, radius=FILLET5_R)

    # Sketch21 → Cut-Extrude10 (cut)
    with BuildSketch(Plane(origin=(0, 45, 0), x_dir=(1, 0, 0), z_dir=(0, 1, 0))):
        with BuildLine():
            Line((-110, -17.5), (-110, -18.5))
            Line((-110, -18.5), (-100, -18.5))
            Line((-100, -18.5), (-100, -17.5))
            ThreePointArc((-100, -17.5), (-105, -12.5), (-110, -17.5))
        make_face()
    extrude(amount=-CUT_EXTRUDE10_DEPTH, mode=Mode.SUBTRACT)


solid = part.part
